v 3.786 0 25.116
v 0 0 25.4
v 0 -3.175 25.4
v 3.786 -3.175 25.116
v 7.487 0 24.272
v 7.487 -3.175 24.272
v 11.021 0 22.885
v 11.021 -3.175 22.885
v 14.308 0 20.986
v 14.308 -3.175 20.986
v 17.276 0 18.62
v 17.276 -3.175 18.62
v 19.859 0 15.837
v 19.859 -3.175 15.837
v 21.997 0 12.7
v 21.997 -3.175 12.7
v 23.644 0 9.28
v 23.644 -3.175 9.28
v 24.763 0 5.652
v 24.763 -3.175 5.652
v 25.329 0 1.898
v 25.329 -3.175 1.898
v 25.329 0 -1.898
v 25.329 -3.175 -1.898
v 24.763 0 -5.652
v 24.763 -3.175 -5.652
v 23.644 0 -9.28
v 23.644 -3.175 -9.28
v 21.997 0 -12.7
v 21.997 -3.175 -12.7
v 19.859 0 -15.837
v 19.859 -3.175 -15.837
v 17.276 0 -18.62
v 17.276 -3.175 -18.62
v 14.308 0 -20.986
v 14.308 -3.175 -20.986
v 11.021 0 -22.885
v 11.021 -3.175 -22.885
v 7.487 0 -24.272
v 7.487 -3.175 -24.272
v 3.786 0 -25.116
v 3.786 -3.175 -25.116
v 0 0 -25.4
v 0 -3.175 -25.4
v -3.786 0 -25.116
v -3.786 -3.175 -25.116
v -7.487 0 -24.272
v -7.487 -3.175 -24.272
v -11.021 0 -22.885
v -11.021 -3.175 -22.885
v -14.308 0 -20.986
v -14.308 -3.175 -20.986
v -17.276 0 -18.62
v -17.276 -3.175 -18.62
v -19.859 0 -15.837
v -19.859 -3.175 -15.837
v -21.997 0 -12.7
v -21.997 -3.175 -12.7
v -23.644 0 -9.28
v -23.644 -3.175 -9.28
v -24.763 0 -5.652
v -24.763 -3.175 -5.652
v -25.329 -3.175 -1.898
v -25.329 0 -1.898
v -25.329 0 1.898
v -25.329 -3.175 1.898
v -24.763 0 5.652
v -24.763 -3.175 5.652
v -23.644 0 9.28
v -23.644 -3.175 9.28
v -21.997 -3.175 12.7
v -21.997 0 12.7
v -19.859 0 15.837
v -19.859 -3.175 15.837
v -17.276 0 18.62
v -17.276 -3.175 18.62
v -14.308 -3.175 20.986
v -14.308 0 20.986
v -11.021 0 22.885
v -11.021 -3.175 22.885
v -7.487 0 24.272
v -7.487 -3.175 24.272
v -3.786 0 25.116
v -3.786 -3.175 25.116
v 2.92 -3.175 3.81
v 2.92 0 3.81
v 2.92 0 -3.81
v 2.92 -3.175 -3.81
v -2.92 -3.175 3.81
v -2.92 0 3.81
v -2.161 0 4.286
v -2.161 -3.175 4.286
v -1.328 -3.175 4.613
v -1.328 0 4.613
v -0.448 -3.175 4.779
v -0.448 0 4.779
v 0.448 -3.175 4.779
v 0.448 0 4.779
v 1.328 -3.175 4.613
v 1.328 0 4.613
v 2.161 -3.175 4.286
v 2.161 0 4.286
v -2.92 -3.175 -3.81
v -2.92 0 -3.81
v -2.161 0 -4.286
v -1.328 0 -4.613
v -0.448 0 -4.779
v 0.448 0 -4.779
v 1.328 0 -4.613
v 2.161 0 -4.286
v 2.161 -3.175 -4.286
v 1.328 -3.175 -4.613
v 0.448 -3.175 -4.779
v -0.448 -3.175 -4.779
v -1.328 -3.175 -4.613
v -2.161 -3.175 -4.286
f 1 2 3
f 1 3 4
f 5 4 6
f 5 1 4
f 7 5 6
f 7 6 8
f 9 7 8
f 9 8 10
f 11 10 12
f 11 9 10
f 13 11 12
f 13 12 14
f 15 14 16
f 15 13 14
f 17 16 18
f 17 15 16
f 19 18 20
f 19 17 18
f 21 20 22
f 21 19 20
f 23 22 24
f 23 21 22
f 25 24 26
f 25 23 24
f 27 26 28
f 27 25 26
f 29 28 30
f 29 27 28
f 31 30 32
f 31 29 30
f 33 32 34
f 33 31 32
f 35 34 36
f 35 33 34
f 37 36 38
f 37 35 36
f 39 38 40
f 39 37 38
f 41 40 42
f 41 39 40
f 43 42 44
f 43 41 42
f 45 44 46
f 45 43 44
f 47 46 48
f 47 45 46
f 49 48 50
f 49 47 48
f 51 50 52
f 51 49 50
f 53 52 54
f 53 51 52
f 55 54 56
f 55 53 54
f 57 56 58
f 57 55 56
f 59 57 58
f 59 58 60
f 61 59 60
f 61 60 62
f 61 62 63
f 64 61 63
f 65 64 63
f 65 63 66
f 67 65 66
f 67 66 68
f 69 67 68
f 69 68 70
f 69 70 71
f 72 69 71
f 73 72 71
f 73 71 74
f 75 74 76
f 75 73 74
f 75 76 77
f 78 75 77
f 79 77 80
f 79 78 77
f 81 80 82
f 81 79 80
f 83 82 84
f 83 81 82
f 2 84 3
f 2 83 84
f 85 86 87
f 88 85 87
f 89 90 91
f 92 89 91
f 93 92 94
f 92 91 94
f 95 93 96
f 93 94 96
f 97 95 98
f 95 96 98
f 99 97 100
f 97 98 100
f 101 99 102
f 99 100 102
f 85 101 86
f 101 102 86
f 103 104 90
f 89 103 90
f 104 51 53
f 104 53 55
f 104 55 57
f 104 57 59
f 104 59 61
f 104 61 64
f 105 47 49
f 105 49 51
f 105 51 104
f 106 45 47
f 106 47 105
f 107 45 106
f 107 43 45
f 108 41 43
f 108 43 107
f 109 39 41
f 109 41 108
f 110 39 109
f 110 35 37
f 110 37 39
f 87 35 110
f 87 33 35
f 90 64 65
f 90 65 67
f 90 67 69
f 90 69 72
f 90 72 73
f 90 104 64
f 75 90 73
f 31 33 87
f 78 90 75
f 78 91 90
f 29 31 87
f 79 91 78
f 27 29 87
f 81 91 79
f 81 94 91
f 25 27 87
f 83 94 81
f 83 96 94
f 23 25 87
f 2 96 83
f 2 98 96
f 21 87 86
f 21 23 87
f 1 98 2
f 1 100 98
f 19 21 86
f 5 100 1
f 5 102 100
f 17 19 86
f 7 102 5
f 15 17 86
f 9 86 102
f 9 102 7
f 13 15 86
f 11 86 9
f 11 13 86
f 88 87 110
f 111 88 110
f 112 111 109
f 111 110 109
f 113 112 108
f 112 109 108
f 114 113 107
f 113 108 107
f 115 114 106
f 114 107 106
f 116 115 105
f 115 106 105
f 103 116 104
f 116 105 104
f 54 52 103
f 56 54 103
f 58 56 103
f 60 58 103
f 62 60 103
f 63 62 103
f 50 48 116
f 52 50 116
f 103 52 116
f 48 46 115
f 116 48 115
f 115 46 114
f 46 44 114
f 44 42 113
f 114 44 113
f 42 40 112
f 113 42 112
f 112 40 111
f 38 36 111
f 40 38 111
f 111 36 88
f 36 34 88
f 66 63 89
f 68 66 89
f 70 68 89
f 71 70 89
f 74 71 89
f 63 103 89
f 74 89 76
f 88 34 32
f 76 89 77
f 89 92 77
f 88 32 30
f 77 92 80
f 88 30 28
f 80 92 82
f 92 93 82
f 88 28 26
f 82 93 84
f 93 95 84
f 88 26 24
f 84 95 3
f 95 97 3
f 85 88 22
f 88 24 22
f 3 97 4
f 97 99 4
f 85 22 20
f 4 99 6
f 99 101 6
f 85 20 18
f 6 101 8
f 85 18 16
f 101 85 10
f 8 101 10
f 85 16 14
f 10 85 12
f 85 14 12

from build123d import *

# Parameters (mm, degrees)
SKETCH1_R           = 25.4
BOSS_EXTRUDE1_DEPTH = 3.175


with BuildPart() as part:
    # Sketch1 → Boss-Extrude1 (new body)
    with BuildSketch(Plane(origin=(0, 0, 0), x_dir=(1, 0, 0), z_dir=(0, 1, 0))):
        with Locations(Location((0, 0, 0), (0, 0, 270))):
            Circle(SKETCH1_R)
        with BuildLine():
            Line((-2.919571886, 3.81), (-2.919571886, -3.81))
            ThreePointArc((-2.919571886, -3.81), (0, -4.8), (2.919571886, -3.81))
            Line((2.919571886, -3.81), (2.919571886, 3.81))
            ThreePointArc((2.919571886, 3.81), (0, 4.8), (-2.919571886, 3.81))
        make_face(mode=Mode.SUBTRACT)
    extrude(amount=-BOSS_EXTRUDE1_DEPTH)


solid = part.part
